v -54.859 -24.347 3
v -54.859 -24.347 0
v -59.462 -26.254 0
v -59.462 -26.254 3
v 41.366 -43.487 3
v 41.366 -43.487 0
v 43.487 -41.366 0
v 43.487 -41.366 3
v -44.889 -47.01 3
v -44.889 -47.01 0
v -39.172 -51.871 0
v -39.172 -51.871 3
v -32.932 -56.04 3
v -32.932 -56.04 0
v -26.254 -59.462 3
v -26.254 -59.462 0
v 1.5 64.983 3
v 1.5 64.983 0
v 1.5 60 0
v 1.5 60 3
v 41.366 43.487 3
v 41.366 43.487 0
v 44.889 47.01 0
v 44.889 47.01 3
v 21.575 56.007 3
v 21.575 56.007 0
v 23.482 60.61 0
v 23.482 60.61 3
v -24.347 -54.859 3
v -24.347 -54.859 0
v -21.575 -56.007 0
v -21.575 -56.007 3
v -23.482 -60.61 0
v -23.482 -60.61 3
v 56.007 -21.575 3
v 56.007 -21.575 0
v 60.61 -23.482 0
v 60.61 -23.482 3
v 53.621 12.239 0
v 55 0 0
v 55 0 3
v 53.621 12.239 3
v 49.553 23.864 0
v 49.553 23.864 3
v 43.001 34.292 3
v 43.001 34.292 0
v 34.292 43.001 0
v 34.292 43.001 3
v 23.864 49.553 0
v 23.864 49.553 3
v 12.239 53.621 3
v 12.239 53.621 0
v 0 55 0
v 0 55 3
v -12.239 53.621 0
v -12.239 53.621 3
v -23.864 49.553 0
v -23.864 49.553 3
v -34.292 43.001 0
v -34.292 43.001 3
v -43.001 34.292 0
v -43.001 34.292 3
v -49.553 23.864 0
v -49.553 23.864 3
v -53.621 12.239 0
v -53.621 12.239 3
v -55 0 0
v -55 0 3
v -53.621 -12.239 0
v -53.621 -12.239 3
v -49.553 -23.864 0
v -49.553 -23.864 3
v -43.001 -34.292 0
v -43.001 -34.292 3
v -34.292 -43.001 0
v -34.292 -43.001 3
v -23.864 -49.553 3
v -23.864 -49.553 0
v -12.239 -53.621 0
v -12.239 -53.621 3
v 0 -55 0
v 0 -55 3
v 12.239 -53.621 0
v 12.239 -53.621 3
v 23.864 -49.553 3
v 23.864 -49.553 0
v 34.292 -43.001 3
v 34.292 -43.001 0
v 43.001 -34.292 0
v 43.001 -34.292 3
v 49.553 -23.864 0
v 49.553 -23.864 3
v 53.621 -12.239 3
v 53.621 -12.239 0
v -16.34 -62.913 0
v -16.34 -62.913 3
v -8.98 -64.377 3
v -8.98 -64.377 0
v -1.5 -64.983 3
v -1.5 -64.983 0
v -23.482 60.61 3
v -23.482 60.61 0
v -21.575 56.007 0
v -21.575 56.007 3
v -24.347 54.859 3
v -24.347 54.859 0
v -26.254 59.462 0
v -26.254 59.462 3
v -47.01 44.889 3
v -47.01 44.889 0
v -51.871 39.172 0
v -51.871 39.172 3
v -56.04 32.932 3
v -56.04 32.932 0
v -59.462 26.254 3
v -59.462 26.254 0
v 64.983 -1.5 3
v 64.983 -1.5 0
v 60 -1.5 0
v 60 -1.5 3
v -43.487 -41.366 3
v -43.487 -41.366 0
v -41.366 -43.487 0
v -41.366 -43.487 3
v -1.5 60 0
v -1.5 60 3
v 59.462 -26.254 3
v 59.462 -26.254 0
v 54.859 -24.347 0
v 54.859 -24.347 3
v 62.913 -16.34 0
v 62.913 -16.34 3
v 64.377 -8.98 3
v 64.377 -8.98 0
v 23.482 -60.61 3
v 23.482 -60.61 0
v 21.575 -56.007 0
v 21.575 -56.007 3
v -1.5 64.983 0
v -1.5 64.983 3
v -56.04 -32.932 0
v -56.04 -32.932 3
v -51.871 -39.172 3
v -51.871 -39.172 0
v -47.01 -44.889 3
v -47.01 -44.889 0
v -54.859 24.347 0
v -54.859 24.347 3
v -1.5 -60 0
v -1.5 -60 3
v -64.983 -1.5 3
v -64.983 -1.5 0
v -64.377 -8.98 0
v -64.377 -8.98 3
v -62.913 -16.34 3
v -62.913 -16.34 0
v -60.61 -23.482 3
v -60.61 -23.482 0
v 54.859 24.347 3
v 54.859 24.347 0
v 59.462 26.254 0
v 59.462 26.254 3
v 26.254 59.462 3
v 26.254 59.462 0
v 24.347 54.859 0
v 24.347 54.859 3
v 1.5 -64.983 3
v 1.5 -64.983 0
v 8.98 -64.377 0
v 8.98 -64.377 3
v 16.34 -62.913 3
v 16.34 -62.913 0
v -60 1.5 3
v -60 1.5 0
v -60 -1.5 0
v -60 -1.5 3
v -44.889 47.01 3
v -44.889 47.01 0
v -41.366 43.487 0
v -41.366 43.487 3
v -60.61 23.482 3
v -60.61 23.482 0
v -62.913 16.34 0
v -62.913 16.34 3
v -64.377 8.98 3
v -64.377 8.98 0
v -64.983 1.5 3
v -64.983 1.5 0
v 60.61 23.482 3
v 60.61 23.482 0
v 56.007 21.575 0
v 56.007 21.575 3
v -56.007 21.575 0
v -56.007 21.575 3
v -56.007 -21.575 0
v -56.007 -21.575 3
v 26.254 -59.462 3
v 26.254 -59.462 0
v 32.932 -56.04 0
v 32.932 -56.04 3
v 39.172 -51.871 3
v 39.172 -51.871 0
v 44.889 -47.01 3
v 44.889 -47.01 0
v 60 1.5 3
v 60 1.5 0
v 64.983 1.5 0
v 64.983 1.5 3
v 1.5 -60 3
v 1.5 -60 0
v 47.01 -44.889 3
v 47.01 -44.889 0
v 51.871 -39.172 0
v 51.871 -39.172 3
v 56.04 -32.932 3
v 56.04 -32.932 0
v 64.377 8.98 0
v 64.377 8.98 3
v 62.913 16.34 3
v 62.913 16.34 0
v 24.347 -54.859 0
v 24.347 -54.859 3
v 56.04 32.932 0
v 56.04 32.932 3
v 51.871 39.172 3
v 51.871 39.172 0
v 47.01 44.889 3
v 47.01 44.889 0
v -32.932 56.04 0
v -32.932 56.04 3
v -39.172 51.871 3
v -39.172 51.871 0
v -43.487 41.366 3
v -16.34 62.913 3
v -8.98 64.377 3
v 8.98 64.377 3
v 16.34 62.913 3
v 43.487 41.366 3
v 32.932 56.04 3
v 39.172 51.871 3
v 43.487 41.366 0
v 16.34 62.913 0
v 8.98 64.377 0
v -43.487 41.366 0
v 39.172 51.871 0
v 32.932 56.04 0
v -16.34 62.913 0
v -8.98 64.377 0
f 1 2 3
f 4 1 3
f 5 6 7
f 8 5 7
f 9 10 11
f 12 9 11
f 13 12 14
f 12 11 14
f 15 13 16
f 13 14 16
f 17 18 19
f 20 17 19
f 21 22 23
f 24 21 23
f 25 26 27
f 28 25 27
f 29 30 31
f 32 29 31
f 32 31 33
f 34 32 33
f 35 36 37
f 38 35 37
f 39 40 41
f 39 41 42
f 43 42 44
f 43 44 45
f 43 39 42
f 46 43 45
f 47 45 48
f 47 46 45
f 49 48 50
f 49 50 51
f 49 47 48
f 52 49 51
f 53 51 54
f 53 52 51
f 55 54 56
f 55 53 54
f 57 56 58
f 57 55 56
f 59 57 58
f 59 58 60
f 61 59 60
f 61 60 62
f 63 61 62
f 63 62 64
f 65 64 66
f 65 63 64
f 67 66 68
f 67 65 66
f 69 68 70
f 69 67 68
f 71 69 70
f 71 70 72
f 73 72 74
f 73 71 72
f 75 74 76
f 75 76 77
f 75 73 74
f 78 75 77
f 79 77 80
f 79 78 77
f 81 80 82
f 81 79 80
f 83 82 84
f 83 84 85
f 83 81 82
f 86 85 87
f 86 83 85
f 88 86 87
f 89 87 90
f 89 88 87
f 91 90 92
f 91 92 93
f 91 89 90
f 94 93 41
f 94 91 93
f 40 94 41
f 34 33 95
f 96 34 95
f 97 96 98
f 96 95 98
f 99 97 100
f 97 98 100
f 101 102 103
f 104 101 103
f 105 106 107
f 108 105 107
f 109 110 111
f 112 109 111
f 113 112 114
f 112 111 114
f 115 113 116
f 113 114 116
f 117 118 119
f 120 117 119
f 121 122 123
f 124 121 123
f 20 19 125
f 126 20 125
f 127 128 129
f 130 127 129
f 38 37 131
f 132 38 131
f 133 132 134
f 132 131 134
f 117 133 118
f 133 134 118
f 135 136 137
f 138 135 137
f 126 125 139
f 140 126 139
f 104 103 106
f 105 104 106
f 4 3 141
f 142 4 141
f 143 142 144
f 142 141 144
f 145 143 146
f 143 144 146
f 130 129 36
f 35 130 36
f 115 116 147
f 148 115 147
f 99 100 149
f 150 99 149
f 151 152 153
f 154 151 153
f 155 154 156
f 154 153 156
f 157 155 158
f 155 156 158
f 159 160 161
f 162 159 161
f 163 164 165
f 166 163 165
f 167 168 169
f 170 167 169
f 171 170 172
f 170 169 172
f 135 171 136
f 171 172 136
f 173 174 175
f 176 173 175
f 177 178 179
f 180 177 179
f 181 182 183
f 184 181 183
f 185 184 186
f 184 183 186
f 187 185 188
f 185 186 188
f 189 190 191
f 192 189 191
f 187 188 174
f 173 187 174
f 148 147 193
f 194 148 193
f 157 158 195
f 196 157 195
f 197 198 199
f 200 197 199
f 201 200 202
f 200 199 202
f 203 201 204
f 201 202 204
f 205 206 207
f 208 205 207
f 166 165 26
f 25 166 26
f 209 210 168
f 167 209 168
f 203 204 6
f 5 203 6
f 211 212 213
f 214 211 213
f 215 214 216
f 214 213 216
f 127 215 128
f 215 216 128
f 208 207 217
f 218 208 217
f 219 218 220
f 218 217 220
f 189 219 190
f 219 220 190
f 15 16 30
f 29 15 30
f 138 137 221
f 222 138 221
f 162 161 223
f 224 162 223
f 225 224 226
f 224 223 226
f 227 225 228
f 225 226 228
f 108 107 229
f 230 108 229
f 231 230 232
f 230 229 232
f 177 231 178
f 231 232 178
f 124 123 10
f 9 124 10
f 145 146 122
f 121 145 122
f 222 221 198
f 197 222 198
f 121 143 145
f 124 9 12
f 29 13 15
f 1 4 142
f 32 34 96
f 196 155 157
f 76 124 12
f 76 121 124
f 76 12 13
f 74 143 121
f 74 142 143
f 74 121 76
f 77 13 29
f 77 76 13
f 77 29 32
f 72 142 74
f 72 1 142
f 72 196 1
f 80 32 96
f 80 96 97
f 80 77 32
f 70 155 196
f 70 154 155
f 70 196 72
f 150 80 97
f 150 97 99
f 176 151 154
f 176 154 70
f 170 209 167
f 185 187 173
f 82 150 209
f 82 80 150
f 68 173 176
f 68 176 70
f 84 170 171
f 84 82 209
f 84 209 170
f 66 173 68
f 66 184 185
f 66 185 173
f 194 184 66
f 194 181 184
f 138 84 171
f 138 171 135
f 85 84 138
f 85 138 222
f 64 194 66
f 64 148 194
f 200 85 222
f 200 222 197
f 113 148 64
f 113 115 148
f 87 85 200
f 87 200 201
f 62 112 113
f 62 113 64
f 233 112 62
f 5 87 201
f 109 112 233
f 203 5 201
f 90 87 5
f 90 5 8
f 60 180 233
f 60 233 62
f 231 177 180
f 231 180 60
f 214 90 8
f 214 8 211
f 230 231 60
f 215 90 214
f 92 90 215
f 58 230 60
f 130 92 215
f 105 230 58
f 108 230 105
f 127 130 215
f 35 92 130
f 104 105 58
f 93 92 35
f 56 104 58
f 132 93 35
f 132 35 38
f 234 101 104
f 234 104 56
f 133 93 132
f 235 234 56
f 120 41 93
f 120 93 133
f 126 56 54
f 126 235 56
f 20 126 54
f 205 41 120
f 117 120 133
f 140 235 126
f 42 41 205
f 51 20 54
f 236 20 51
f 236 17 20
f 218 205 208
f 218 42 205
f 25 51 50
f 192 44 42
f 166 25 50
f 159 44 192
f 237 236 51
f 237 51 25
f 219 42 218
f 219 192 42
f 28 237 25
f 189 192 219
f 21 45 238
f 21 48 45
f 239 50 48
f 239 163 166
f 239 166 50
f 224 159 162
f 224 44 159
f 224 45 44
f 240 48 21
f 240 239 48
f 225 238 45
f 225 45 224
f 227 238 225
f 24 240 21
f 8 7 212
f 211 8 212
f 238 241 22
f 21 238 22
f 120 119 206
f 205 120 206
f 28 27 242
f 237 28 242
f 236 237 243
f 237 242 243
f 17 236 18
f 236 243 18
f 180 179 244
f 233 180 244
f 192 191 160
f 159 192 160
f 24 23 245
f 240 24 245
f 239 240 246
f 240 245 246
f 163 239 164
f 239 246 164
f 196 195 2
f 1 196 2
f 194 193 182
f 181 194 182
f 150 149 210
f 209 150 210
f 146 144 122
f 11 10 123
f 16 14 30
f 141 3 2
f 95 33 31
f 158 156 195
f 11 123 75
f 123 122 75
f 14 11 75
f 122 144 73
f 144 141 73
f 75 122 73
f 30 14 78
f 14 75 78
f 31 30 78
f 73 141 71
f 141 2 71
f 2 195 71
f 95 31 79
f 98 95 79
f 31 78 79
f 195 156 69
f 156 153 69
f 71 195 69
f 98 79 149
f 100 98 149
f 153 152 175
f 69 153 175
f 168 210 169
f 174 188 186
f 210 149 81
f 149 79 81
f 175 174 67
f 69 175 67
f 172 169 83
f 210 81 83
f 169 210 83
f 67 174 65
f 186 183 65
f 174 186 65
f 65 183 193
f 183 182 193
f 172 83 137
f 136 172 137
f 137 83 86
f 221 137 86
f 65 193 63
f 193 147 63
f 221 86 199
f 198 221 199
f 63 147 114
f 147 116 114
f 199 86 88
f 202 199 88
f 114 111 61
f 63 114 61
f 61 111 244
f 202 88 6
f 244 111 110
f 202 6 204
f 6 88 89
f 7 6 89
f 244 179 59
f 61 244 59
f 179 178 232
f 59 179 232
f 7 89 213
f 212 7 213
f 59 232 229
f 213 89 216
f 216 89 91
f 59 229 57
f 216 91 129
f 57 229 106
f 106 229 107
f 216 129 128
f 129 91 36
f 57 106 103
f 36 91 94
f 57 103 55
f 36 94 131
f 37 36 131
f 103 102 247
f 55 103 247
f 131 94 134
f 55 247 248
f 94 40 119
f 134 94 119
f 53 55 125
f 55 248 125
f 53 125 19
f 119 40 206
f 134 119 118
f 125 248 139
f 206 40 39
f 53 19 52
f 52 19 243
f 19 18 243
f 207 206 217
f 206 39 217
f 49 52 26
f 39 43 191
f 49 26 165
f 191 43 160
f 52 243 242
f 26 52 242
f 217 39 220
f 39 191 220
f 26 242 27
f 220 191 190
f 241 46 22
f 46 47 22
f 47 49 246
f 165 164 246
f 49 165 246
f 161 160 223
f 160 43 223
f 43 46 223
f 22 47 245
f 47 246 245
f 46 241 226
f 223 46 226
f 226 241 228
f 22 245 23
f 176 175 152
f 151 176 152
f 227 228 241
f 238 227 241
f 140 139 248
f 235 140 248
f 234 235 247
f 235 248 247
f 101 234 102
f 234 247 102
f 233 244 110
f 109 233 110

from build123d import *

# Parameters (mm, degrees)
F0_R     = 55
F1_DEPTH = 3


with BuildPart() as f1:
    # F0 (on Top) → F1 (new body)
    with BuildSketch(Plane.XY):
        with BuildLine():
            Line((60, 1.5), (64.98269, 1.5))
            ThreePointArc((64.98269, 1.5), (63.751043, 12.680871), (60.610202, 23.48198))
            Line((60.610202, 23.48198), (56.006797, 21.575187))
            Line((56.006797, 21.575187), (54.858747, 24.346825))
            Line((54.858747, 24.346825), (59.462152, 26.253618))
            ThreePointArc((59.462152, 26.253618), (54.045525, 36.112065), (47.010361, 44.889041))
            Line((47.010361, 44.889041), (43.487067, 41.365747))
            Line((43.487067, 41.365747), (41.365747, 43.487067))
            Line((41.365747, 43.487067), (44.889041, 47.010361))
            ThreePointArc((44.889041, 47.010361), (36.112065, 54.045525), (26.253618, 59.462152))
            Line((26.253618, 59.462152), (24.346825, 54.858747))
            Line((24.346825, 54.858747), (21.575187, 56.006797))
            Line((21.575187, 56.006797), (23.48198, 60.610202))
            ThreePointArc((23.48198, 60.610202), (12.680871, 63.751043), (1.5, 64.98269))
            Line((1.5, 64.98269), (1.5, 60))
            Line((1.5, 60), (-1.5, 60))
            Line((-1.5, 60), (-1.5, 64.98269))
            ThreePointArc((-1.5, 64.98269), (-12.680871, 63.751043), (-23.48198, 60.610202))
            Line((-23.48198, 60.610202), (-21.575187, 56.006797))
            Line((-21.575187, 56.006797), (-24.346825, 54.858747))
            Line((-24.346825, 54.858747), (-26.253618, 59.462152))
            ThreePointArc((-26.253618, 59.462152), (-36.112065, 54.045525), (-44.889041, 47.010361))
            Line((-44.889041, 47.010361), (-41.365747, 43.487067))
            Line((-41.365747, 43.487067), (-43.487067, 41.365747))
            Line((-43.487067, 41.365747), (-47.010361, 44.889041))
            ThreePointArc((-47.010361, 44.889041), (-54.045525, 36.112065), (-59.462152, 26.253618))
            Line((-59.462152, 26.253618), (-54.858747, 24.346825))
            Line((-54.858747, 24.346825), (-56.006797, 21.575187))
            Line((-56.006797, 21.575187), (-60.610202, 23.48198))
            ThreePointArc((-60.610202, 23.48198), (-63.751043, 12.680871), (-64.98269, 1.5))
            Line((-64.98269, 1.5), (-60, 1.5))
            Line((-60, 1.5), (-60, -1.5))
            Line((-60, -1.5), (-64.98269, -1.5))
            ThreePointArc((-64.98269, -1.5), (-63.751043, -12.680871), (-60.610202, -23.48198))
            Line((-60.610202, -23.48198), (-56.006797, -21.575187))
            Line((-56.006797, -21.575187), (-54.858747, -24.346825))
            Line((-54.858747, -24.346825), (-59.462152, -26.253618))
            ThreePointArc((-59.462152, -26.253618), (-54.045525, -36.112065), (-47.010361, -44.889041))
            Line((-47.010361, -44.889041), (-43.487067, -41.365747))
            Line((-43.487067, -41.365747), (-41.365747, -43.487067))
            Line((-41.365747, -43.487067), (-44.889041, -47.010361))
            ThreePointArc((-44.889041, -47.010361), (-36.112065, -54.045525), (-26.253618, -59.462152))
            Line((-26.253618, -59.462152), (-24.346825, -54.858747))
            Line((-24.346825, -54.858747), (-21.575187, -56.006797))
            Line((-21.575187, -56.006797), (-23.48198, -60.610202))
            ThreePointArc((-23.48198, -60.610202), (-12.680871, -63.751043), (-1.5, -64.98269))
            Line((-1.5, -64.98269), (-1.5, -60))
            Line((-1.5, -60), (0, -60))
            Line((0, -60), (1.5, -60))
            Line((1.5, -60), (1.5, -64.98269))
            ThreePointArc((1.5, -64.98269), (12.680871, -63.751043), (23.48198, -60.610202))
            Line((23.48198, -60.610202), (21.575187, -56.006797))
            Line((21.575187, -56.006797), (24.346825, -54.858747))
            Line((24.346825, -54.858747), (26.253618, -59.462152))
            ThreePointArc((26.253618, -59.462152), (36.112065, -54.045525), (44.889041, -47.010361))
            Line((44.889041, -47.010361), (41.365747, -43.487067))
            Line((41.365747, -43.487067), (43.487067, -41.365747))
            Line((43.487067, -41.365747), (47.010361, -44.889041))
            ThreePointArc((47.010361, -44.889041), (54.045525, -36.112065), (59.462152, -26.253618))
            Line((59.462152, -26.253618), (54.858747, -24.346825))
            Line((54.858747, -24.346825), (56.006797, -21.575187))
            Line((56.006797, -21.575187), (60.610202, -23.48198))
            ThreePointArc((60.610202, -23.48198), (63.751043, -12.680871), (64.98269, -1.5))
            Line((64.98269, -1.5), (60, -1.5))
            Line((60, -1.5), (60, 1.5))
        make_face()
        Circle(F0_R, mode=Mode.SUBTRACT)
    extrude(amount=F1_DEPTH)


solid = f1.part
